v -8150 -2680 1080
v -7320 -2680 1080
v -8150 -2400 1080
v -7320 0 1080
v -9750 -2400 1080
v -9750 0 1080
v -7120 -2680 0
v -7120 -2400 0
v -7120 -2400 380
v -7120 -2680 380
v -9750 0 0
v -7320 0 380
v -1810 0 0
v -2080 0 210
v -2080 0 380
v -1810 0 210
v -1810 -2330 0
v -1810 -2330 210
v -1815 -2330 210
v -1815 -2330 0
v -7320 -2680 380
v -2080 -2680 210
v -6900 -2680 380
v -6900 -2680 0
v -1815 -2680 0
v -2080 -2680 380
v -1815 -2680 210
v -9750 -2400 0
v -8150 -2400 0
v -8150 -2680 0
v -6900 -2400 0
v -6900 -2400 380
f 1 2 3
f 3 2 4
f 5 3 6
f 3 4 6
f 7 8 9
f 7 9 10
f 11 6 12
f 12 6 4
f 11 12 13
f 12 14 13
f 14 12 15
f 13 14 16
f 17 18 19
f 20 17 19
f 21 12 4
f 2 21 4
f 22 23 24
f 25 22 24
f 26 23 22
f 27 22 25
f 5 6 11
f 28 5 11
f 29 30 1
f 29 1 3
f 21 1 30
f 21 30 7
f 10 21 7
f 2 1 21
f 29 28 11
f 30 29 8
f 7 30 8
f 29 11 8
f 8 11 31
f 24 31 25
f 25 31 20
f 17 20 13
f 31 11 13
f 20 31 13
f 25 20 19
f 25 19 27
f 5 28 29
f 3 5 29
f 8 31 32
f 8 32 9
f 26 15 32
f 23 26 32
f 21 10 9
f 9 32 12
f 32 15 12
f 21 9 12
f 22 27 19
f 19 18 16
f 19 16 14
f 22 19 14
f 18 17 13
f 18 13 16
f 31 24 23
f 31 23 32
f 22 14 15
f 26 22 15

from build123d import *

# Parameters (mm, degrees)
F2_DEPTH = 2680
F0_W     = 1600
F0_H     = 550
F3_DEPTH = 1080
F4_DEPTH = 380


with BuildPart() as f2:
    # F1 (on Front) → F2 (new body, through all)
    with BuildSketch(Plane.XZ):
        Polygon((-9750, 0), (-1810, 0), (-1810, 210), (-2080, 210), (-2080, 380), (-7320, 380), (-7320, 1080), (-9750, 1080), align=None)
    extrude(amount=F2_DEPTH)

    # F0 (on Top) → F3 (cut, through all)
    with BuildSketch(Plane.XY):
        with Locations((-8950, -2675)):
            Rectangle(F0_W, F0_H)
    extrude(amount=F3_DEPTH, mode=Mode.SUBTRACT)

    # F0 (on Top) → F4 (cut, through all)
    with BuildSketch(Plane.XY):
        Polygon((-6900, -2400), (-7120, -2400), (-7120, -2950), (-6420, -2950), (-5360, -2950), (-2200, -2950), (-2200, -6950), (-1900, -7250), (-1900, -2950), (-1670, -2950), (-1670, -2475), (0, -2475), (0, -2330), (-1815, -2330), (-1815, -2680), (-6900, -2680), align=None)
    extrude(amount=F4_DEPTH, mode=Mode.SUBTRACT)


solid = f2.part
